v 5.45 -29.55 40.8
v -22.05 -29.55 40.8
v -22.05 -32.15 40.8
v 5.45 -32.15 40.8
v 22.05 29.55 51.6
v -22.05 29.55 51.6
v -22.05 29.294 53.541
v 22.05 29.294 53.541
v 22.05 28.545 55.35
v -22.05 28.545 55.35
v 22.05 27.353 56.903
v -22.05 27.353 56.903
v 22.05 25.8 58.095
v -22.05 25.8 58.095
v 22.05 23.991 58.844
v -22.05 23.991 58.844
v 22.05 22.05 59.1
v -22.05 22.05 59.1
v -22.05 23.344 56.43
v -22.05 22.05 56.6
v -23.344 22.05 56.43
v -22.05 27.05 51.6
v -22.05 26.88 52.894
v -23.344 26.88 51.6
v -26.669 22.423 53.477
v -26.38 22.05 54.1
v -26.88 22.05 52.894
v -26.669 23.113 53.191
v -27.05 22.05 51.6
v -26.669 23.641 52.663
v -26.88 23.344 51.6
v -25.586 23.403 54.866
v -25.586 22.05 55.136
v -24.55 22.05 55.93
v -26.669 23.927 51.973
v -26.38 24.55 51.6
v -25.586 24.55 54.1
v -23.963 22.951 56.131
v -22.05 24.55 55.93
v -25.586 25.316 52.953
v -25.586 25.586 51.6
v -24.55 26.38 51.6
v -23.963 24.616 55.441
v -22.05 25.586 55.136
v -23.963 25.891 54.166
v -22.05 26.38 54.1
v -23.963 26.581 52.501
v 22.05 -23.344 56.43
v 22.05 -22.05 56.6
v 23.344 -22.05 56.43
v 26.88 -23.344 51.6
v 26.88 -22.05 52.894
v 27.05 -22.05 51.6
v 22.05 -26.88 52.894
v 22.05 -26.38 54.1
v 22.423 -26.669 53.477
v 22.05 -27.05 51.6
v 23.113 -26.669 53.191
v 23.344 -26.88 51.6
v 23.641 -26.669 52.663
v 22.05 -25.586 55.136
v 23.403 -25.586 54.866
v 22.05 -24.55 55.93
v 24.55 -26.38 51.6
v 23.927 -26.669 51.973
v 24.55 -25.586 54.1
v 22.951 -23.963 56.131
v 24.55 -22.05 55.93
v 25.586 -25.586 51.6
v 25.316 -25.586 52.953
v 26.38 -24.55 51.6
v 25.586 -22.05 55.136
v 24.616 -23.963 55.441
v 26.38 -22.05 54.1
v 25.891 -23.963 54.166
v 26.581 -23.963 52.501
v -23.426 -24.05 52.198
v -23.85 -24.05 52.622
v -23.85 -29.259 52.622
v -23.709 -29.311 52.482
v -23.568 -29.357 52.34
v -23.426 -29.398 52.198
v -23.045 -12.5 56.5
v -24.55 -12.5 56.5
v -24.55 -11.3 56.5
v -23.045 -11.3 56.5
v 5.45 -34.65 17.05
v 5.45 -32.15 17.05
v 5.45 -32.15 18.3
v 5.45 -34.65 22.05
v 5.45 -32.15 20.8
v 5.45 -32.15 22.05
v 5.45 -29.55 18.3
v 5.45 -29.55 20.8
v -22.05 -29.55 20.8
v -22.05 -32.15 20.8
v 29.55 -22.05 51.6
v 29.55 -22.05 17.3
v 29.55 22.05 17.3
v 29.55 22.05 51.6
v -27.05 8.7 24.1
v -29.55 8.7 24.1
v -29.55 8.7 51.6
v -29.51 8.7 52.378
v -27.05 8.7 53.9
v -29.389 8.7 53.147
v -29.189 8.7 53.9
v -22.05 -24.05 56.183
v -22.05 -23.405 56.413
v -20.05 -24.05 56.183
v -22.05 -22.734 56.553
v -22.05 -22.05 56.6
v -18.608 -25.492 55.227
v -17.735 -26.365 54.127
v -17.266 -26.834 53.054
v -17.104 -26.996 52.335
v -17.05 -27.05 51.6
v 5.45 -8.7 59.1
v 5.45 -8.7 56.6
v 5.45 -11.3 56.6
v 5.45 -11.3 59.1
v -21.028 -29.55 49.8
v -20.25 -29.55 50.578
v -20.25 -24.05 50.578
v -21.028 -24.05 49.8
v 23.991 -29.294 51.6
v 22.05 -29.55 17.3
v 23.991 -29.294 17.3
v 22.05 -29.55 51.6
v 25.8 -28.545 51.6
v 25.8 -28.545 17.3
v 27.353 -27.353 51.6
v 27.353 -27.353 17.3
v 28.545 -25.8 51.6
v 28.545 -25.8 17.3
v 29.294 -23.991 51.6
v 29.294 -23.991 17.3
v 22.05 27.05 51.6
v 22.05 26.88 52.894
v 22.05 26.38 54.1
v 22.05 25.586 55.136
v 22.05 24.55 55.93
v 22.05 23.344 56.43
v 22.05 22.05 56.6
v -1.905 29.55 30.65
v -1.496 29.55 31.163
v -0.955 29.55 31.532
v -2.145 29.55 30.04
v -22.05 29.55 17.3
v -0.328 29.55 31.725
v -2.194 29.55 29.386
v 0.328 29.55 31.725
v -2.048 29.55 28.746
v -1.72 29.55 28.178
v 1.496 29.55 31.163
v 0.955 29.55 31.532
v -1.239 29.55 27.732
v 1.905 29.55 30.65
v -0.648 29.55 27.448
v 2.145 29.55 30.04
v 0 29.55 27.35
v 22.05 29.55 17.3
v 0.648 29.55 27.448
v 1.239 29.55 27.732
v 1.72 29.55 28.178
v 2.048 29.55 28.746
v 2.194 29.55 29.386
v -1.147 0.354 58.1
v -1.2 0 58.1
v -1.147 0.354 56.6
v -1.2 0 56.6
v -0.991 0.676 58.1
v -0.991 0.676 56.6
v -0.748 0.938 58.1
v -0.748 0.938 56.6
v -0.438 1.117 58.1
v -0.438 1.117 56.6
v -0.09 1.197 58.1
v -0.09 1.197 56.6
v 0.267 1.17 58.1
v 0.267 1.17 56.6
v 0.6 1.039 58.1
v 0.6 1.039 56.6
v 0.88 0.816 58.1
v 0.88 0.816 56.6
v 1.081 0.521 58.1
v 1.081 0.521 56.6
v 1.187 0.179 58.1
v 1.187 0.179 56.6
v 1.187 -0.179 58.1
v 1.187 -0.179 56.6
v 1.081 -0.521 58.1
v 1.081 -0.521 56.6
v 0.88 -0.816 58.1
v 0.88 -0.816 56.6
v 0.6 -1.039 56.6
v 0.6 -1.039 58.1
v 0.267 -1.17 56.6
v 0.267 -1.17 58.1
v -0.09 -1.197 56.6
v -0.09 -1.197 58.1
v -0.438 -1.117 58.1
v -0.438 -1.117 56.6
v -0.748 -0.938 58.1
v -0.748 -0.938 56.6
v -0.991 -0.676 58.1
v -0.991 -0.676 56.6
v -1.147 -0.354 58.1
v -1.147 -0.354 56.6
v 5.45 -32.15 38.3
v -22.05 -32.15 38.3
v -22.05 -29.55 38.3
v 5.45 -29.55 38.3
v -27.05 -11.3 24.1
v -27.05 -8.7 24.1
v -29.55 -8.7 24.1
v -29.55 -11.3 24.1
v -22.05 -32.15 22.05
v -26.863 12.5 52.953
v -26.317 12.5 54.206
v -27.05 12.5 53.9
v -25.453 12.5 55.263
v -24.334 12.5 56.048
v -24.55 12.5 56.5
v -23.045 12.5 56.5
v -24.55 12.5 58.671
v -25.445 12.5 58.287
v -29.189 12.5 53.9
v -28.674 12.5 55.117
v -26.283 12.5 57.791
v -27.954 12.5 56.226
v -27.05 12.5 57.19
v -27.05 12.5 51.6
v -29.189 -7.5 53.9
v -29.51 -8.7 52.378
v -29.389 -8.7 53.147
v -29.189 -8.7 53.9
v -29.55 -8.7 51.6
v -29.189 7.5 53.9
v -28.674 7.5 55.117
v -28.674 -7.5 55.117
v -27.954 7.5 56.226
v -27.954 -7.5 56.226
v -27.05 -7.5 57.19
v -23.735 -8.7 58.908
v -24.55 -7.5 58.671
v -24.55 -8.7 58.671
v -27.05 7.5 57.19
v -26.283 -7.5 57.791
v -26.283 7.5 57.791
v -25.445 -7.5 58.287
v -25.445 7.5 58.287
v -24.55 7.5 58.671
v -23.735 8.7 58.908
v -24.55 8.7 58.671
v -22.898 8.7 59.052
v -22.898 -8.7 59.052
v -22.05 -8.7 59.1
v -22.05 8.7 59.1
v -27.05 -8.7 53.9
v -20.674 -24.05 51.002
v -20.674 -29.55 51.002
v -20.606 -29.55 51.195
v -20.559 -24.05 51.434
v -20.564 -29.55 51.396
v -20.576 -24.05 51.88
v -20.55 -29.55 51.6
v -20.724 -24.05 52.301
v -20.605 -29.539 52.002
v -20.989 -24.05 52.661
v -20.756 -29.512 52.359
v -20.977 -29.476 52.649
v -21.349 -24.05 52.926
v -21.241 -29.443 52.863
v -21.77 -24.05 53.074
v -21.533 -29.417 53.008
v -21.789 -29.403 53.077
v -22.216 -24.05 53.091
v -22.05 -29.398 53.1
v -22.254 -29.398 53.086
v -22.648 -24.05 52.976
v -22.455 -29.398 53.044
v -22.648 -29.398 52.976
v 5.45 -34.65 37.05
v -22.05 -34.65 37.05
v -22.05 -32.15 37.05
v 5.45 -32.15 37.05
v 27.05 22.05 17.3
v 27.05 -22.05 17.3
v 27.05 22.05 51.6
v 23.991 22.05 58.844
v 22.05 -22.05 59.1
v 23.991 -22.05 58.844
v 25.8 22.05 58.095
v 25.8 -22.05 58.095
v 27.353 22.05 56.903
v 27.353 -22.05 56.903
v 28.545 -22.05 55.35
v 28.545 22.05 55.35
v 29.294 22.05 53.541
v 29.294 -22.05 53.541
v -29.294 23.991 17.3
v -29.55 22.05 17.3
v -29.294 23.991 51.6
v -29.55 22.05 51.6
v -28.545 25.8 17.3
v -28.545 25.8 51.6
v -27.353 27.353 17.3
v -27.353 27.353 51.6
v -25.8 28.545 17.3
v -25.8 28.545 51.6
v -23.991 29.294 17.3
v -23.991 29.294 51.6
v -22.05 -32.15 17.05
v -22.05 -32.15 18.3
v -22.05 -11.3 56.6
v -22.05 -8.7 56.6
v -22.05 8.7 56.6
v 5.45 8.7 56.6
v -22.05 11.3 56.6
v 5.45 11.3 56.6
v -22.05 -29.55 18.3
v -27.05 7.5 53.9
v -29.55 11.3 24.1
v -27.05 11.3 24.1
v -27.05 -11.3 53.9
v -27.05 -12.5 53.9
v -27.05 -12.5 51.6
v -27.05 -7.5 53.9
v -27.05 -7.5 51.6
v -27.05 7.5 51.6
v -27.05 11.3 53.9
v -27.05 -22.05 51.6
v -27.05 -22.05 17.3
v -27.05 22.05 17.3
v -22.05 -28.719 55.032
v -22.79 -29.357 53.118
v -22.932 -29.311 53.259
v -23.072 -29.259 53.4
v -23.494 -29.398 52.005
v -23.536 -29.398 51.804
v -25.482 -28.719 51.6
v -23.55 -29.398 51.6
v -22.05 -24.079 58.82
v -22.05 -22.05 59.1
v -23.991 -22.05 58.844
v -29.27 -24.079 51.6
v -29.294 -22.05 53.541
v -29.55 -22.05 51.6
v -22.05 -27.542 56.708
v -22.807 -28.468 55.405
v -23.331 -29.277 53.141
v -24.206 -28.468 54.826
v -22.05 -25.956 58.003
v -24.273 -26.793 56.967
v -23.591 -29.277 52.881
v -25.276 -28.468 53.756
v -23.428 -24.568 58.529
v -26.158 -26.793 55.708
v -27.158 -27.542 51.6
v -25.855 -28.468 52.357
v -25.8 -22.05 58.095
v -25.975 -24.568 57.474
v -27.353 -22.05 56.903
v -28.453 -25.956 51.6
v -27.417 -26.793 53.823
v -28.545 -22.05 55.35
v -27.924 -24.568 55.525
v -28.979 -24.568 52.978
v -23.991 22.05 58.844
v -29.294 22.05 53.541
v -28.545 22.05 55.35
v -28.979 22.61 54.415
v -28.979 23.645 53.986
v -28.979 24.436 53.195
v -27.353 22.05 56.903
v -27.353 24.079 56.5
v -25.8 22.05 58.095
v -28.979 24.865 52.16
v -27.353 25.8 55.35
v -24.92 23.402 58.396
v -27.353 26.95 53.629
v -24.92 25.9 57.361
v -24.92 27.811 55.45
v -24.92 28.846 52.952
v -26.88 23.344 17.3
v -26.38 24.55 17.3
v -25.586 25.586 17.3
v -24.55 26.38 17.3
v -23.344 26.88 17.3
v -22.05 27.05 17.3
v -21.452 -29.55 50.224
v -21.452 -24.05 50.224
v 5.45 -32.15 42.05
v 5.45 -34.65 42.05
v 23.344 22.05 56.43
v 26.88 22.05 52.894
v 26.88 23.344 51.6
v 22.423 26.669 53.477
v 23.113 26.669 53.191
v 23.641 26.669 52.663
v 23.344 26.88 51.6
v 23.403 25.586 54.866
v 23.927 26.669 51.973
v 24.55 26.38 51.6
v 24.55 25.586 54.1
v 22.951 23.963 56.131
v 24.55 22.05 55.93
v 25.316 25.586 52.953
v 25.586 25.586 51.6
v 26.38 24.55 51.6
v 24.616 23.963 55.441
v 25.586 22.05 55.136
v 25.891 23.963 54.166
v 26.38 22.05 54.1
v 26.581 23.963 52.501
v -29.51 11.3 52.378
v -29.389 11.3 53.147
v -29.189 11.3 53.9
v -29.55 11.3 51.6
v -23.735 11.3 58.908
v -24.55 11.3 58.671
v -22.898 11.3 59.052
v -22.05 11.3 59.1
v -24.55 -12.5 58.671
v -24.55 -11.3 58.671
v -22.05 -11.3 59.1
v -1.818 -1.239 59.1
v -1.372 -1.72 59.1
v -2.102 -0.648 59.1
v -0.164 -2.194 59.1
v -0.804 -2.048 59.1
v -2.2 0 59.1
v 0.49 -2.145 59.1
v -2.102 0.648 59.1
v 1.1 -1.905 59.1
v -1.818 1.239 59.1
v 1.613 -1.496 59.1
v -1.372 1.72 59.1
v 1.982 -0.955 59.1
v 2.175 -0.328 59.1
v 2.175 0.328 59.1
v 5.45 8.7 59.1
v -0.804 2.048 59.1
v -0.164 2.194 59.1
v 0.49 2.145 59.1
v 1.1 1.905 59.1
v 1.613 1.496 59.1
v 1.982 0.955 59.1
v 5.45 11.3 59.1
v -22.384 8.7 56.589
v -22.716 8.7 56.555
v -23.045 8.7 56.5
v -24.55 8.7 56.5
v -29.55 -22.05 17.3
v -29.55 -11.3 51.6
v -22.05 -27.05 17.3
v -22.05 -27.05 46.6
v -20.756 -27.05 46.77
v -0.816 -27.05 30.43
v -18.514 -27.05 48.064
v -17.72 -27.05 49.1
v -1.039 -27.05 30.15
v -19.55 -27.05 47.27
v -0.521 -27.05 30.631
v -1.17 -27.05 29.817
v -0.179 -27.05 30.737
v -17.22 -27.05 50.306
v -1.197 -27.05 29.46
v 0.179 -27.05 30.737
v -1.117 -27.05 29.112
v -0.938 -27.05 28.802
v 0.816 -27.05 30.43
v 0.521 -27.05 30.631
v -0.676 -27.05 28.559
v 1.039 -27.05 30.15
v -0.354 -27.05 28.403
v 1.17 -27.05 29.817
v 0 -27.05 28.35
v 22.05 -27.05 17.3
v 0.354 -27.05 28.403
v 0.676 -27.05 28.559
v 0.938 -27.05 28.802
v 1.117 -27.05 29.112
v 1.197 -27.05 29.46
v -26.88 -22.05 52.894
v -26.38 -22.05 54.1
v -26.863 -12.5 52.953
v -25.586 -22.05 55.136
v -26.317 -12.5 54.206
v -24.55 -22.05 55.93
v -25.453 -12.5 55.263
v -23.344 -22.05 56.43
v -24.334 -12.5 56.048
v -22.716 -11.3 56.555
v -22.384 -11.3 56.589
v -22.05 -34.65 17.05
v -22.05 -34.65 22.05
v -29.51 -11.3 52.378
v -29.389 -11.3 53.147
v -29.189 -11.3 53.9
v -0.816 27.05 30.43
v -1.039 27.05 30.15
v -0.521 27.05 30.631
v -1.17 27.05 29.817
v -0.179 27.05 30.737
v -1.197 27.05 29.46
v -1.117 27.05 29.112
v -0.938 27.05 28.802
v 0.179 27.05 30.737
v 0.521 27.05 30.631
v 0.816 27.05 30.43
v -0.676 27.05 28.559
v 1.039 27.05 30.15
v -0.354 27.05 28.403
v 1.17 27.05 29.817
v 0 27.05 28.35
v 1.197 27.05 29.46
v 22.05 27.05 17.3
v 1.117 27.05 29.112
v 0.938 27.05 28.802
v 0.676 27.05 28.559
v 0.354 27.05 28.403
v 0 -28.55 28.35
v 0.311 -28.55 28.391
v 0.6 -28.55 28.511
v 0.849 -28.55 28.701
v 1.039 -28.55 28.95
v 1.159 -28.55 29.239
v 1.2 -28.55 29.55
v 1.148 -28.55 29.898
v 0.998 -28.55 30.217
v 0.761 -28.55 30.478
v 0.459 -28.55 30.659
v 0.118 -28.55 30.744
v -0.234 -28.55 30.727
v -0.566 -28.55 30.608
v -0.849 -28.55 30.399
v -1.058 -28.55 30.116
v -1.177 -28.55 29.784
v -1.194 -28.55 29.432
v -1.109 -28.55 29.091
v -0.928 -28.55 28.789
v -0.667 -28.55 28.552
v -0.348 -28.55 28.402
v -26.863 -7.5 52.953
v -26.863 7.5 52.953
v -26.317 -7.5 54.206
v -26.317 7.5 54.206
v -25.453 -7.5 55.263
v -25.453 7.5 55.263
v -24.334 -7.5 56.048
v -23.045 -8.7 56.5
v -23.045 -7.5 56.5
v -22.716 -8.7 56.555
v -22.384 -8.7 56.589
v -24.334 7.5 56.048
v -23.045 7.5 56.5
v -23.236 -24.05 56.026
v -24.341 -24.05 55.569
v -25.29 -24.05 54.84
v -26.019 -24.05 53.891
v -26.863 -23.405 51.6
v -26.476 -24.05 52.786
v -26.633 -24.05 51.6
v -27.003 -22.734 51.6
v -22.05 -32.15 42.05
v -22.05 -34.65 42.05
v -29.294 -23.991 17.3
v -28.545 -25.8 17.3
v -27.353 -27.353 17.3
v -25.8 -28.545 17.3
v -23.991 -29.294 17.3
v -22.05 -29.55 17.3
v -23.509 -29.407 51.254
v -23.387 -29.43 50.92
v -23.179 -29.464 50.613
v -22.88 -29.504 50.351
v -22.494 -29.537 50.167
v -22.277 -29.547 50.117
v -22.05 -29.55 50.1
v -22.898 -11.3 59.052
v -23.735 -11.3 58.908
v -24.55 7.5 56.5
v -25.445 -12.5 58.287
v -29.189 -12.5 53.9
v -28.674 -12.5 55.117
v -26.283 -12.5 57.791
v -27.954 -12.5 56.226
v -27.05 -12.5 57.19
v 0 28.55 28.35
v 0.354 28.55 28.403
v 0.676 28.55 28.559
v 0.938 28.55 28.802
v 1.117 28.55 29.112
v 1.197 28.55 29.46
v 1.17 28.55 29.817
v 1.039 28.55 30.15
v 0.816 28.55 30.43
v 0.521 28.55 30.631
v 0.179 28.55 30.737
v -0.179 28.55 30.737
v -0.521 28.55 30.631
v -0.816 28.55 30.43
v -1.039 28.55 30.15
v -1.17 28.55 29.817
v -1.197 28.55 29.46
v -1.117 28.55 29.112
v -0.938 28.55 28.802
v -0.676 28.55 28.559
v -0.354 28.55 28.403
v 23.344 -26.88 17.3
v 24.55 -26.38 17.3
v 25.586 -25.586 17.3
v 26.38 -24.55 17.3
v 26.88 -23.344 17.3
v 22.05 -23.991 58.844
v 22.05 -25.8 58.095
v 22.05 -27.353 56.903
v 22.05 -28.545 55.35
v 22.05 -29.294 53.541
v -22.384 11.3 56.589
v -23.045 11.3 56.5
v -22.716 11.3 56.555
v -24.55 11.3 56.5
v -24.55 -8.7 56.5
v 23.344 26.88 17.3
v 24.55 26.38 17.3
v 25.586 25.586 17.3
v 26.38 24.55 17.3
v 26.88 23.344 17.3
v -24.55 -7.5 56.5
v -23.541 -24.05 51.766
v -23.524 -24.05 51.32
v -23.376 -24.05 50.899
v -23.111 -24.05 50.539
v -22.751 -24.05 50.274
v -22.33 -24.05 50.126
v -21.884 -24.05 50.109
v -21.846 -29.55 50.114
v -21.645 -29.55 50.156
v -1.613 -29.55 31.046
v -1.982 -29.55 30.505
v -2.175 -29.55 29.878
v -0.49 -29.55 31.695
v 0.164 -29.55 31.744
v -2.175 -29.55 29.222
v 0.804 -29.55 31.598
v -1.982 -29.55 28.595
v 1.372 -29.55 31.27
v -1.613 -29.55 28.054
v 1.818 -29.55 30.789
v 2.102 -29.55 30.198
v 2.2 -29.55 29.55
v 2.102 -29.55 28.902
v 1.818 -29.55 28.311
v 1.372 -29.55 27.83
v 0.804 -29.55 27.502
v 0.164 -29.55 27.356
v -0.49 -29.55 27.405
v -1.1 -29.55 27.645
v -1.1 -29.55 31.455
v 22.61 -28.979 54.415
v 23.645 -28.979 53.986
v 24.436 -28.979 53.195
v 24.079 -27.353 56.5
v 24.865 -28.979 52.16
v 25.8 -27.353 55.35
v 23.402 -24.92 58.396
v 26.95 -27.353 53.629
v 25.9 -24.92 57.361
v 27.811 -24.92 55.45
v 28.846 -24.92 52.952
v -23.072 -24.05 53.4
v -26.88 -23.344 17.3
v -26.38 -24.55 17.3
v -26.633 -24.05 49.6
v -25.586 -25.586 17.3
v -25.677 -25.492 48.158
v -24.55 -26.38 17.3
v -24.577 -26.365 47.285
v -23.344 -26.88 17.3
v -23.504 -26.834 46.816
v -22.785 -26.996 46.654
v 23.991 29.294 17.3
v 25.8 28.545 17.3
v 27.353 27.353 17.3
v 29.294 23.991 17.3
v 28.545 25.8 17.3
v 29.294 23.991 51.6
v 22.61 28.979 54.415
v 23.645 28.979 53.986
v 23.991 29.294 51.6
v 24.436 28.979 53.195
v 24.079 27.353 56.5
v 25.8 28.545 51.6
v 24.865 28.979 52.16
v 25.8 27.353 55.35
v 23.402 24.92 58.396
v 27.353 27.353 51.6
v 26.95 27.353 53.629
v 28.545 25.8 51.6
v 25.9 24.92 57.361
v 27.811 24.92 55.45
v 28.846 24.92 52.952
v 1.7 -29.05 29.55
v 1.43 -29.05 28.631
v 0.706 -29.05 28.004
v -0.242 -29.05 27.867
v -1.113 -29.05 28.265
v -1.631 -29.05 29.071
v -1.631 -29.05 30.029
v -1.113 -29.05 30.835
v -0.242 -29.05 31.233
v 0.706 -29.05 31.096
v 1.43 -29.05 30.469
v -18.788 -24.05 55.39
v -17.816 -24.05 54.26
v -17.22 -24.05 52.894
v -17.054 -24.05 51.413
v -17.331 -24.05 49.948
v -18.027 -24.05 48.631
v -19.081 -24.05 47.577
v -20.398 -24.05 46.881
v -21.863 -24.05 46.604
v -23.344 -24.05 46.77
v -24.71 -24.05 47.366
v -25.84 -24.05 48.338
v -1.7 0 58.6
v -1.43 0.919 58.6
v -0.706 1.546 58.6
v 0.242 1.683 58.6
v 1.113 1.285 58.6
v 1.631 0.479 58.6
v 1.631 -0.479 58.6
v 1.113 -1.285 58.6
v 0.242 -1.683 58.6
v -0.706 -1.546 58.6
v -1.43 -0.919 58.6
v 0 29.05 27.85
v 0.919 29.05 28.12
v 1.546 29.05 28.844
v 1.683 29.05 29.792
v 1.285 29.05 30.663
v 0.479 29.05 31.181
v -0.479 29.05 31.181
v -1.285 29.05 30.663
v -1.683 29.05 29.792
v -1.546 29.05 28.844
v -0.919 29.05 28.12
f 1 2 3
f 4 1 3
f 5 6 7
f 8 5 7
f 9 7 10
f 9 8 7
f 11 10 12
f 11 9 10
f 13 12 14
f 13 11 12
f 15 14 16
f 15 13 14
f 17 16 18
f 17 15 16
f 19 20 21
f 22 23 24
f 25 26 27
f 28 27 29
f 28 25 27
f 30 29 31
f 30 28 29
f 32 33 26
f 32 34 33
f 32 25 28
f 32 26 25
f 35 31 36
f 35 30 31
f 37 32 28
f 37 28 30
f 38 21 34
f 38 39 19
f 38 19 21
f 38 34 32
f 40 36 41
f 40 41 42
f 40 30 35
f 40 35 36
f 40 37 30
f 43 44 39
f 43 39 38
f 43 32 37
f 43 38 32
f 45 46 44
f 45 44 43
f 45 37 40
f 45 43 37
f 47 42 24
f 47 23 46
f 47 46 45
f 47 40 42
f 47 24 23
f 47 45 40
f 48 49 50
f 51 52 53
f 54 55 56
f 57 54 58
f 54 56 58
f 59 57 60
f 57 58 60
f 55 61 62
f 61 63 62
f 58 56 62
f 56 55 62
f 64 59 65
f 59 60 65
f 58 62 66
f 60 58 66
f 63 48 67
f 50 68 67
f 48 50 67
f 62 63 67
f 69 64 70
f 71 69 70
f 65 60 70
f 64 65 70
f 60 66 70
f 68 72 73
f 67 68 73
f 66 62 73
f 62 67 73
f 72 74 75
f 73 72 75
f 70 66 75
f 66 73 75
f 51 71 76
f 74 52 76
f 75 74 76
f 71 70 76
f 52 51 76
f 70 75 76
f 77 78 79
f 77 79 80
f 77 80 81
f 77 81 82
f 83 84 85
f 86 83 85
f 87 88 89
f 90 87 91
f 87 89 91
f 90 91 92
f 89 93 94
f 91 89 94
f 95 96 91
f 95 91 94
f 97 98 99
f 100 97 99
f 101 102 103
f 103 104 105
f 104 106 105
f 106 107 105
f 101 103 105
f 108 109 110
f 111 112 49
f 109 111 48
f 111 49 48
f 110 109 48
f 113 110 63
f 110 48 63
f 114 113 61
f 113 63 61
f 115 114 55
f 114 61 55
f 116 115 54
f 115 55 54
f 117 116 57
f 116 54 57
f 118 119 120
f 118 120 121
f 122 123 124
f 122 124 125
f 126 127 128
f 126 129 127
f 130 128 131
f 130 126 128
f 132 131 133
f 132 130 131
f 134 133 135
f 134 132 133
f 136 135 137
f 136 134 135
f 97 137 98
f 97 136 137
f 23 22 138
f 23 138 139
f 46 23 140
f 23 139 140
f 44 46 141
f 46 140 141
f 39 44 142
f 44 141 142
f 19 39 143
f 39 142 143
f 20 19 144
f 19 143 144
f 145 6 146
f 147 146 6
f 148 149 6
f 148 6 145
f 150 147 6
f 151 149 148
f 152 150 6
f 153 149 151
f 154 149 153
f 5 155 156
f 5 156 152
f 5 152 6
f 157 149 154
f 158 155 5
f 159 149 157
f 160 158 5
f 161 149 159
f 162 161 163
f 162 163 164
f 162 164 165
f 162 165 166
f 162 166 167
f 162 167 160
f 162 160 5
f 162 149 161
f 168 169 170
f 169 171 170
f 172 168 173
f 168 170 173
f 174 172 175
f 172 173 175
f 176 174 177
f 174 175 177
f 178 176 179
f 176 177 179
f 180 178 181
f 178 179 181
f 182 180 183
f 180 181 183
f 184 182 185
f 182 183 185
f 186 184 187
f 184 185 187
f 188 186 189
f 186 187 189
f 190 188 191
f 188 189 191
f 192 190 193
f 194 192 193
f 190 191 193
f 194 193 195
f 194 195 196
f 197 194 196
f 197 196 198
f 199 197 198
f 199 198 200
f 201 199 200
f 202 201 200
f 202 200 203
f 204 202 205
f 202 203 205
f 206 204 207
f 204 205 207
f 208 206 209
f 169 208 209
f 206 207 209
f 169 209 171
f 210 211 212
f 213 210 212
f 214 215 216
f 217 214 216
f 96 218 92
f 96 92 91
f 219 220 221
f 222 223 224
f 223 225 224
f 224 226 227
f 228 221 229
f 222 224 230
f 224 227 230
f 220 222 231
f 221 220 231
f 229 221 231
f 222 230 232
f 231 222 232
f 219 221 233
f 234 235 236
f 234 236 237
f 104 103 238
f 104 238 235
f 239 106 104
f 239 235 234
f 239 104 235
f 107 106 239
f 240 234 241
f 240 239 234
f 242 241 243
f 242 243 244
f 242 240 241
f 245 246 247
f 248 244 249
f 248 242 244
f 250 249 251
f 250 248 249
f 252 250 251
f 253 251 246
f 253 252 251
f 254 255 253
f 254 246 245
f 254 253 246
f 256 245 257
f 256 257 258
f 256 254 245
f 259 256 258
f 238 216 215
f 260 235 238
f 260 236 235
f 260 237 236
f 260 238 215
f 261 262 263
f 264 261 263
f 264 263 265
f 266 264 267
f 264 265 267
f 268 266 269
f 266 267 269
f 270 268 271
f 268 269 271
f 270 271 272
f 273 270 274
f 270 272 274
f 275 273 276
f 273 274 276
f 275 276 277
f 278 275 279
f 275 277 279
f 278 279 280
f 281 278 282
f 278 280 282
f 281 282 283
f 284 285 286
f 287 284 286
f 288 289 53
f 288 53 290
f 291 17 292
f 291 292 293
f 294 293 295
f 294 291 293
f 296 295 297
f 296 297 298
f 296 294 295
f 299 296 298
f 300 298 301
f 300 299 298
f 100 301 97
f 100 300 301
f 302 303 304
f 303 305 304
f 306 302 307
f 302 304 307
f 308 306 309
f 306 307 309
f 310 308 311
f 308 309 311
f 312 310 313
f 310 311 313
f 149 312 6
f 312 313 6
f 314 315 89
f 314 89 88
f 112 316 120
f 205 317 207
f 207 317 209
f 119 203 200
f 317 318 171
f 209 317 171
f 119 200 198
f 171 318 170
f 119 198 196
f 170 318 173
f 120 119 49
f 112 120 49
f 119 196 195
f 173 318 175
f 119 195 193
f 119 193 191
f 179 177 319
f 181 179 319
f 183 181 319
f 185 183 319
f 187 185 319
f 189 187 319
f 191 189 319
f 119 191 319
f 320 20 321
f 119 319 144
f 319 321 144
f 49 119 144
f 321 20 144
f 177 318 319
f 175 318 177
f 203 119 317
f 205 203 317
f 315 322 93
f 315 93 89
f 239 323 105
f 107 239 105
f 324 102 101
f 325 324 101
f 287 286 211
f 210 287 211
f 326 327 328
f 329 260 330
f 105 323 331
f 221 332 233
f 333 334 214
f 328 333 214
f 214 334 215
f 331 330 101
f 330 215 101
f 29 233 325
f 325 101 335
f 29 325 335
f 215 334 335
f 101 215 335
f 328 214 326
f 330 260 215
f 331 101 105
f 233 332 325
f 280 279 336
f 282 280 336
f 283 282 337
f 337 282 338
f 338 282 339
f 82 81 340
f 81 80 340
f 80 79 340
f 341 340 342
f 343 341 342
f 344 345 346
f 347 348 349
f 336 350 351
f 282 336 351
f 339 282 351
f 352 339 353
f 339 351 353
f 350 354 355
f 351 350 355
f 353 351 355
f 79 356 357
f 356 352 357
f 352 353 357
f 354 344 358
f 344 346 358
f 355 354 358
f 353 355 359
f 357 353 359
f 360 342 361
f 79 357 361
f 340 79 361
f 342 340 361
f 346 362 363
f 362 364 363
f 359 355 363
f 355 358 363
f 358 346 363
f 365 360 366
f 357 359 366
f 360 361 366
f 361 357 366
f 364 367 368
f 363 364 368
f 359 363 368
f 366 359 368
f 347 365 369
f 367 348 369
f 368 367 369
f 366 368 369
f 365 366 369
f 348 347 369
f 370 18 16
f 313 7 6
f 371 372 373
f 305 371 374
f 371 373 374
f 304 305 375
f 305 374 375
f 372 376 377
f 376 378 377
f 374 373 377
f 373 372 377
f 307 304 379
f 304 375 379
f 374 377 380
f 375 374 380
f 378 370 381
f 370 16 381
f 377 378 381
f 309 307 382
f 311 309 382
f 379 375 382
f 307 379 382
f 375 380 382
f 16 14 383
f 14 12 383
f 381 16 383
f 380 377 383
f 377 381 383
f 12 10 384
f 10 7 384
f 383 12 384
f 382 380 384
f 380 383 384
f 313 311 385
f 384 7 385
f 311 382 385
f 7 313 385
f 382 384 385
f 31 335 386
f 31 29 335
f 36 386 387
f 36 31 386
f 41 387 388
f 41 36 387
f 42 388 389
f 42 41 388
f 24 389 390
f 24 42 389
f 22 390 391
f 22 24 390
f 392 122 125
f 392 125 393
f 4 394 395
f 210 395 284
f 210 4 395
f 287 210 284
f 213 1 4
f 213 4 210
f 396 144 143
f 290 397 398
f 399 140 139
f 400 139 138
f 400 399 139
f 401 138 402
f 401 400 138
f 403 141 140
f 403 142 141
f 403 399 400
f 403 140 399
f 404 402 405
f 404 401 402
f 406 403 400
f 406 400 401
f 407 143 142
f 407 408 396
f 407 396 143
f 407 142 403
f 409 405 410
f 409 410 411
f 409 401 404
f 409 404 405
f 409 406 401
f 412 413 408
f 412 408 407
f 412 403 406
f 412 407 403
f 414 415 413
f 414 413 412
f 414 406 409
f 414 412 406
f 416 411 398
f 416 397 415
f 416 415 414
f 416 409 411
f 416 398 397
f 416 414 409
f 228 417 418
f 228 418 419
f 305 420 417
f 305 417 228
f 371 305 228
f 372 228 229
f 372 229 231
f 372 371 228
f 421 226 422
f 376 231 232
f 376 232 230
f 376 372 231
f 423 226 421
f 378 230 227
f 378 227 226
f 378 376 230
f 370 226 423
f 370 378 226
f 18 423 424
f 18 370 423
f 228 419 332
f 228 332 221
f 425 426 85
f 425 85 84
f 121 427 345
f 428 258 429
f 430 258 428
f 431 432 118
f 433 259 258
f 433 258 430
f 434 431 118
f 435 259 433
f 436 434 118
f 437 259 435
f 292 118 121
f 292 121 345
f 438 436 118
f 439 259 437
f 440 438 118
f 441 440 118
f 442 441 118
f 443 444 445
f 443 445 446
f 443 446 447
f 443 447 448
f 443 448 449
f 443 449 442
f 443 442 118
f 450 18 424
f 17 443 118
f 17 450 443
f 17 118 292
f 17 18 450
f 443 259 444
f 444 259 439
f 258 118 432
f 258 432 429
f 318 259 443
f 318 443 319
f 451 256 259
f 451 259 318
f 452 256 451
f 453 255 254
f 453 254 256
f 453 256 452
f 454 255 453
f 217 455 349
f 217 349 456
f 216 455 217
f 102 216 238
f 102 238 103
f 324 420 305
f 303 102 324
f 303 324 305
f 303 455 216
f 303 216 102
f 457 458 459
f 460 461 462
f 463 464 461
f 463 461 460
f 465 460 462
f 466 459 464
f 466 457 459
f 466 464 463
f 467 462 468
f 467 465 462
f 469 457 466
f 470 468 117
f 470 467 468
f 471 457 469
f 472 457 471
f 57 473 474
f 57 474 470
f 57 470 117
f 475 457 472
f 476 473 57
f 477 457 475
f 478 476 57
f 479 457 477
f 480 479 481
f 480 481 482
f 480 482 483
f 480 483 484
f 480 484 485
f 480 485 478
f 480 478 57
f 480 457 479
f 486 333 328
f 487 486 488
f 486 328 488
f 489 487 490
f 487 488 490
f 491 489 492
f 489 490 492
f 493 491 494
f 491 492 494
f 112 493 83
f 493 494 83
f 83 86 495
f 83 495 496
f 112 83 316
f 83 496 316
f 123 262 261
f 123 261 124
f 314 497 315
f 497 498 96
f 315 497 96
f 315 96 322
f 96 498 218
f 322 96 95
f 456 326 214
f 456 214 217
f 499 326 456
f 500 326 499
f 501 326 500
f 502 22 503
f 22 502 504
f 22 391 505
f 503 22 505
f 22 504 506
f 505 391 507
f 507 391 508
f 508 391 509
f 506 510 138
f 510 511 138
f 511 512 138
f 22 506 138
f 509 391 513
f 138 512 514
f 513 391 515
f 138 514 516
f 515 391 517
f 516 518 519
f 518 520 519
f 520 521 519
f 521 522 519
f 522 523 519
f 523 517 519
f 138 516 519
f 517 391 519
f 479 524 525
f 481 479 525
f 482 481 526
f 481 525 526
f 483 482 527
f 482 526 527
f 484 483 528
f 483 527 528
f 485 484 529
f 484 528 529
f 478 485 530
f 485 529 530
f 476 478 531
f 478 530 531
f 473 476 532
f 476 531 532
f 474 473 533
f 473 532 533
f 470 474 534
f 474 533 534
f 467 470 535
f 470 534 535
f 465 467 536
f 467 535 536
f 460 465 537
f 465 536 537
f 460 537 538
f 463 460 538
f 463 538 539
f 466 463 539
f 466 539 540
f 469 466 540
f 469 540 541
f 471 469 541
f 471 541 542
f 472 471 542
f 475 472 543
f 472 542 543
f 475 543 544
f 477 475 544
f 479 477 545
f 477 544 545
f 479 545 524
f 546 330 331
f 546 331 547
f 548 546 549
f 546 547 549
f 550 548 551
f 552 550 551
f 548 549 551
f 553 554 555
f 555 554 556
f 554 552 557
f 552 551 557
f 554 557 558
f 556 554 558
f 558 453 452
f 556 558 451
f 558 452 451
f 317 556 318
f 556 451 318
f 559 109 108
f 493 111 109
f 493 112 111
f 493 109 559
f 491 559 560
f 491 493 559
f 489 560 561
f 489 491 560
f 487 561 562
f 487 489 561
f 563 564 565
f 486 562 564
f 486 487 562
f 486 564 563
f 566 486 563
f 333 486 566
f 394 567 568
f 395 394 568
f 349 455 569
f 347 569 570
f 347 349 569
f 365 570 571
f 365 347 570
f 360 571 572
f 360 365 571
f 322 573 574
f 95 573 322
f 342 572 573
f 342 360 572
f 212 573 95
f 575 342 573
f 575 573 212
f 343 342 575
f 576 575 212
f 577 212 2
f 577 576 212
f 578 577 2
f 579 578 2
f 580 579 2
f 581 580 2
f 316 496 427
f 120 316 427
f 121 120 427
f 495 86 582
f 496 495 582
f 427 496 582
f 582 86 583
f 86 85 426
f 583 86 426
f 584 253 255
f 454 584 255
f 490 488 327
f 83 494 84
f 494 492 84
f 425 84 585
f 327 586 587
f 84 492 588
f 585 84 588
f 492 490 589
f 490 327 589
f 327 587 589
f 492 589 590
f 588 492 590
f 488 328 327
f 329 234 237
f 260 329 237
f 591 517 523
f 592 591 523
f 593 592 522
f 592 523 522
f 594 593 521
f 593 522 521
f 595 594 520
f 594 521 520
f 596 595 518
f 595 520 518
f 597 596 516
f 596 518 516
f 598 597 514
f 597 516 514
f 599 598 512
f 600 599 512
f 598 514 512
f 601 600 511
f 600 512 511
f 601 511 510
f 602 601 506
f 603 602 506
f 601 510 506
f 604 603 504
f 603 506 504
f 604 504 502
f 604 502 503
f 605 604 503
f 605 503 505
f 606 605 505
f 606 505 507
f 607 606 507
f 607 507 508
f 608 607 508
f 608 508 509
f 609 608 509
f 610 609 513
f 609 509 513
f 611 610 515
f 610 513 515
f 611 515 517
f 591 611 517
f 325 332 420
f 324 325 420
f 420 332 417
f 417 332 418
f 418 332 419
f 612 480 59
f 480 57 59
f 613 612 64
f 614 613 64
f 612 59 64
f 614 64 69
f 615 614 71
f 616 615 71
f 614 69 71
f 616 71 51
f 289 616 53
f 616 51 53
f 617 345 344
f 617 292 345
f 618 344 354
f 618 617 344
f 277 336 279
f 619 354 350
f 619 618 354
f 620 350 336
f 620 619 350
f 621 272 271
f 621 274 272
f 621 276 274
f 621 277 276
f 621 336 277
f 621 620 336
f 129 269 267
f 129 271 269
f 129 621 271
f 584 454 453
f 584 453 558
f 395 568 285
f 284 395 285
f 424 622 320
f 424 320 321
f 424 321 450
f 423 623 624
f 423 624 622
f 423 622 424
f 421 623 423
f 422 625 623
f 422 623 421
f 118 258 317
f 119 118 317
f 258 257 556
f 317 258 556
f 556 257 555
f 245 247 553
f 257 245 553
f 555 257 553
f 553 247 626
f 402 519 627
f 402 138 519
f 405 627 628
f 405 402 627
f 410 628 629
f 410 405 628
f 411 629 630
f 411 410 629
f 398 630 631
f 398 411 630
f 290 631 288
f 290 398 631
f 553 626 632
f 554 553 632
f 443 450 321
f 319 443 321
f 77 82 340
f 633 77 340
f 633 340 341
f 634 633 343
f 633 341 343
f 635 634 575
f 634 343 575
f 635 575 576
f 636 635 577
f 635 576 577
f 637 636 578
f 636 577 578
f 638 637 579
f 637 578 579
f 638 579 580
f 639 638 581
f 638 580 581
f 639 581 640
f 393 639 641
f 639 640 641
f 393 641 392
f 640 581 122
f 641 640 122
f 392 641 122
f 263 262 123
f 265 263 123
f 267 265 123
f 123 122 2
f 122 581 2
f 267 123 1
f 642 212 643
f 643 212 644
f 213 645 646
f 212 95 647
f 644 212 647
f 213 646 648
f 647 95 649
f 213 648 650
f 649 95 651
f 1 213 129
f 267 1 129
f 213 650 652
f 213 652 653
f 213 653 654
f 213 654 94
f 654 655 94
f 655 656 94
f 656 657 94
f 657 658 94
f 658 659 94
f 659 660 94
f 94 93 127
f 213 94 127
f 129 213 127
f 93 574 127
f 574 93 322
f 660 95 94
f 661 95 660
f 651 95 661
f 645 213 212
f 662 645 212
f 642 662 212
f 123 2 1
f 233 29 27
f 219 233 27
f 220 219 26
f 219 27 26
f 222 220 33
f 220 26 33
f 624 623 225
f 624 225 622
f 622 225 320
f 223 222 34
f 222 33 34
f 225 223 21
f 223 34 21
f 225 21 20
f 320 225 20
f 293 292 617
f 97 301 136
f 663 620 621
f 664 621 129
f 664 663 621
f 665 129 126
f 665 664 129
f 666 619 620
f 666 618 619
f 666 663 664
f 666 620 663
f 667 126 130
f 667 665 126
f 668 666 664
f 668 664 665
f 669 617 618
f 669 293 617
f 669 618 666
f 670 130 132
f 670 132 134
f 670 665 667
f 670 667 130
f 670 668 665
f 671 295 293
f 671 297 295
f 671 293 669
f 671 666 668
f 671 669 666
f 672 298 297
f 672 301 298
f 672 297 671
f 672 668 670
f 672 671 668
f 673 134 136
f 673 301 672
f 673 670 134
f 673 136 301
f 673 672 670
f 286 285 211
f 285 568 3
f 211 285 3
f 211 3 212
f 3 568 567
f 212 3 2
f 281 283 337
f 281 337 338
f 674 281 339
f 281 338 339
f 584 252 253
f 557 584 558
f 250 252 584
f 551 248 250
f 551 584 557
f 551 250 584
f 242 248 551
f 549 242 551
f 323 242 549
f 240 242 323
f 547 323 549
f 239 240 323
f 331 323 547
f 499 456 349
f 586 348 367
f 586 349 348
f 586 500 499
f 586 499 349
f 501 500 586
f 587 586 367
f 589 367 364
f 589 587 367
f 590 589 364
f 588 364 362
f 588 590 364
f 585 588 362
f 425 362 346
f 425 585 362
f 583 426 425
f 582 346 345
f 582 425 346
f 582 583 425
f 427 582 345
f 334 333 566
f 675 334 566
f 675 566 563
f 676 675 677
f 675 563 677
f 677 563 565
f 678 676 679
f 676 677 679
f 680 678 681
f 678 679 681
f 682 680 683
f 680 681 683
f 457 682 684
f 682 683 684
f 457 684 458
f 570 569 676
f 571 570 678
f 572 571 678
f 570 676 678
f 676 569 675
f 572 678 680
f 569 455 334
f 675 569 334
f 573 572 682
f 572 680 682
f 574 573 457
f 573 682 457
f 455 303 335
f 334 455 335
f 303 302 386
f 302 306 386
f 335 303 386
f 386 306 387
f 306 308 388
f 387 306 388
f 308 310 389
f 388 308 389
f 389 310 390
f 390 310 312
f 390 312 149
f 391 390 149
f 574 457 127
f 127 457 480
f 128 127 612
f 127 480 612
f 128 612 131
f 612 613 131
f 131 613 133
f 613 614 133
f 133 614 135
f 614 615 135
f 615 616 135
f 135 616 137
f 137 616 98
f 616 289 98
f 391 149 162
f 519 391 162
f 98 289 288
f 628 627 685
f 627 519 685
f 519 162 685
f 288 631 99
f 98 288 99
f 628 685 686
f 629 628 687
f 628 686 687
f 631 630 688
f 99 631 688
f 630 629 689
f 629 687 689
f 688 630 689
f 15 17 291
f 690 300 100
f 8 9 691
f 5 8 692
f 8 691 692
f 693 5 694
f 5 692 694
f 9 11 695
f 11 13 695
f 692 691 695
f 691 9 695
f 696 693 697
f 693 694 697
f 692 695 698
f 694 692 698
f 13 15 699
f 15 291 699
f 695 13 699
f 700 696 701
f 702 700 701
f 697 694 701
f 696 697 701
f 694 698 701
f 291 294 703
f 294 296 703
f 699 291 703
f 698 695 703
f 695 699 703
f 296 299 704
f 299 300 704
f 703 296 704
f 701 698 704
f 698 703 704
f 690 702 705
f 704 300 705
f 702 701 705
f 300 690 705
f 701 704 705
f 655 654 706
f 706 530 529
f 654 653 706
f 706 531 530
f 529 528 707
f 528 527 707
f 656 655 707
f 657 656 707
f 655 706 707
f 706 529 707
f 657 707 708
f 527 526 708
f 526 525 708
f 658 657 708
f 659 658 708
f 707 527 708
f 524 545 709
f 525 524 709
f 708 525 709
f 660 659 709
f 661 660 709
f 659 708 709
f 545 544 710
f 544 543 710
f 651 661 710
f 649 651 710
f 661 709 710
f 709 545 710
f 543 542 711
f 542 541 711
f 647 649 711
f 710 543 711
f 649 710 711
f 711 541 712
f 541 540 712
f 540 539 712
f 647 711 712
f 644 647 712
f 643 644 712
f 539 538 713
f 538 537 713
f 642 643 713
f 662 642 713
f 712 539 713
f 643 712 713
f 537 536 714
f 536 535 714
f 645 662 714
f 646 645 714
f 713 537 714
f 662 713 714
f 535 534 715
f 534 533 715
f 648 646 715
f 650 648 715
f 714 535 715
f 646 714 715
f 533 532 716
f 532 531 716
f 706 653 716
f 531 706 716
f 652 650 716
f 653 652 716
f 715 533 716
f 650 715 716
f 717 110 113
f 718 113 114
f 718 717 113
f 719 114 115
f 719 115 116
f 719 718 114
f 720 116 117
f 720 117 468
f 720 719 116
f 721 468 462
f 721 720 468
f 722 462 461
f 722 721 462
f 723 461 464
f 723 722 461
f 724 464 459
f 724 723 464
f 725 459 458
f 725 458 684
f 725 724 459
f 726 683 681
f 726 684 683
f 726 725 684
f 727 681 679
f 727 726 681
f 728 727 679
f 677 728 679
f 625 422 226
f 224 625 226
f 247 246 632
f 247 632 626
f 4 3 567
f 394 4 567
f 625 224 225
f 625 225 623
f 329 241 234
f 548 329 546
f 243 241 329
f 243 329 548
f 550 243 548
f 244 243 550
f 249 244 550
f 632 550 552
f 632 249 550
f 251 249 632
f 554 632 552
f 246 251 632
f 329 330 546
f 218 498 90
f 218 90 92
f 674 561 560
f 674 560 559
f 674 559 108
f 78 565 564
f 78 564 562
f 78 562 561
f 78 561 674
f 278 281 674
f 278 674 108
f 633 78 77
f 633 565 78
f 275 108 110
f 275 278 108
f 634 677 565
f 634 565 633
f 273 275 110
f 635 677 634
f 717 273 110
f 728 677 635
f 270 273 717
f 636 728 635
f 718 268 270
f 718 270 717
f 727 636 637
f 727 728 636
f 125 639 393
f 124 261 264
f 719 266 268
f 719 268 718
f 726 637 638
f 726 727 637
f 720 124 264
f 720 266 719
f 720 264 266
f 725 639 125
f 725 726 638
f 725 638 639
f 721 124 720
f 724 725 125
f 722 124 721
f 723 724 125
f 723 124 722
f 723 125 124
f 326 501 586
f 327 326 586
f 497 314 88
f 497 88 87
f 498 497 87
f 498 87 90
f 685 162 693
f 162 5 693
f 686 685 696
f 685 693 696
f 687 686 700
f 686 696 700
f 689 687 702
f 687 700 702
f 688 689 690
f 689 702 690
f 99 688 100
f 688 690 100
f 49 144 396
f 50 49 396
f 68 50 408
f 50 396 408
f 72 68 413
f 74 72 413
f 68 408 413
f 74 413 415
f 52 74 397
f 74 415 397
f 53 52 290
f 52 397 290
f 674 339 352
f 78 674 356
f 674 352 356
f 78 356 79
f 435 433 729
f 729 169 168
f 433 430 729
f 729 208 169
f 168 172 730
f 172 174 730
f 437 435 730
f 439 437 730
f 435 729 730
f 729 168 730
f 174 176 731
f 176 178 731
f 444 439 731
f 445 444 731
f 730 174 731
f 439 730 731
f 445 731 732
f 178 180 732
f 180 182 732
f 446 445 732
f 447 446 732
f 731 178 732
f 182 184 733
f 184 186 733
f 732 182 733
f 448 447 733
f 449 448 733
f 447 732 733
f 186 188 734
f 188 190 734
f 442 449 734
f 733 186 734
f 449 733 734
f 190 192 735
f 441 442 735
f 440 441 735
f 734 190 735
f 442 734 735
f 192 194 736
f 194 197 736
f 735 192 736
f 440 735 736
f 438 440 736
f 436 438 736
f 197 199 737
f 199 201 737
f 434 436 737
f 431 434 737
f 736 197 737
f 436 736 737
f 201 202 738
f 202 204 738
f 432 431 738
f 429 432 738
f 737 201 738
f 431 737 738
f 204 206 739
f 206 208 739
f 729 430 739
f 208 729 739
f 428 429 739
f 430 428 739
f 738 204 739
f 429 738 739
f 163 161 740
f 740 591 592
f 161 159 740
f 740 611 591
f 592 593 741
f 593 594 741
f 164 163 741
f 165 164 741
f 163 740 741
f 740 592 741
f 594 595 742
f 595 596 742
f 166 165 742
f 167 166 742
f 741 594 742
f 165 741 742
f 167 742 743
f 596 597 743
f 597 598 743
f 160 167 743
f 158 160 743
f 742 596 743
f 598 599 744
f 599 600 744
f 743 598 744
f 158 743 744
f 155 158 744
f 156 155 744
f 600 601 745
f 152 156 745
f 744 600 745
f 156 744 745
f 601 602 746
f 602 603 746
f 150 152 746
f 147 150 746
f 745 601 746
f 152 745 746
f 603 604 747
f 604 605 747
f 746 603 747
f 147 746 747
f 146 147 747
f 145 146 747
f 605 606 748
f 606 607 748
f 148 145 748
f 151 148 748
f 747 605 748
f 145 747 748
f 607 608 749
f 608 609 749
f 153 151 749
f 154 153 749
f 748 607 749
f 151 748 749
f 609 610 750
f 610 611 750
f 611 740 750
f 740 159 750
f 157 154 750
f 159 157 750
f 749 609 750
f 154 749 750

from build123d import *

# Parameters (mm, degrees)
SKETCH1_W                                            = 59.1
SKETCH1_H                                            = 59.1
BOSS_EXTRUDE1_DEPTH                                  = 59.1
CUT_EXTRUDE1_START                                   = -2.25
SKETCH2_W                                            = 116.357411776
SKETCH2_H                                            = 94.431830133
CUT_EXTRUDE1_DEPTH                                   = 71.232302632
FILLET1_R                                            = 7.5
SHELL1_T                                             = -2.5
CUT_EXTRUDE7_DEPTH                                   = 35
CUT_EXTRUDE8_DEPTH                                   = 35
SKETCH16_W                                           = 0.690169944
SKETCH16_H                                           = 5
CUT_EXTRUDE9_DEPTH                                   = 88.003290168
BOSS_EXTRUDE2_START                                  = 3
SKETCH18_R                                           = 5
BOSS_EXTRUDE2_DEPTH                                  = 3
SKETCH17_R                                           = 1.5
CUT_EXTRUDE10_DEPTH                                  = 10
CUT_EXTRUDE11_REACH                                  = 90.65
CSK_SLOT_FOR_M2_COUNTERSUNK_FLAT_HEAD_SC_D           = 2.4
CSK_SLOT_FOR_M2_COUNTERSUNK_FLAT_HEAD_SC_CSINK_D     = 4.4
CSK_SLOT_FOR_M2_COUNTERSUNK_FLAT_HEAD_SC_CSINK_ANGLE = 90
CSK_SLOT_FOR_M2_COUNTERSUNK_FLAT_HEA_2_D             = 2.4
CSK_SLOT_FOR_M2_COUNTERSUNK_FLAT_HEA_2_CSINK_D       = 4.4
CSK_SLOT_FOR_M2_COUNTERSUNK_FLAT_HEA_2_CSINK_ANGLE   = 90
CSK_SLOT_FOR_M2_COUNTERSUNK_FLAT_HEA_3_D             = 2.4
CSK_SLOT_FOR_M2_COUNTERSUNK_FLAT_HEA_3_CSINK_D       = 4.4
CSK_SLOT_FOR_M2_COUNTERSUNK_FLAT_HEA_3_CSINK_ANGLE   = 90
BOSS_EXTRUDE3_DEPTH                                  = 35
SKETCH28_W                                           = 7.5
SKETCH28_H                                           = 5.1
CUT_EXTRUDE12_DEPTH                                  = 62.984090748


with BuildPart() as part:
    # Sketch1 → Boss-Extrude1 (new body)
    with BuildSketch(Plane.XY):
        Rectangle(SKETCH1_W, SKETCH1_H)
    extrude(amount=BOSS_EXTRUDE1_DEPTH)

    # Sketch2 → Cut-Extrude1 (cut, through all)
    with BuildSketch(Plane(origin=(-13.400446417, -13.400446417, 19.55), x_dir=(0.9659258262890684, -0.2588190451025203, 0), z_dir=(0, 0, 1)).offset(CUT_EXTRUDE1_START)):
        with Locations((15.241895832, 15.980077556)):
            Rectangle(SKETCH2_W, SKETCH2_H)
    extrude(amount=-CUT_EXTRUDE1_DEPTH, mode=Mode.SUBTRACT)

    # Fillet1
    fillet1_edges = [part.edges().sort_by_distance(p)[0] for p in [
        (29.55, 0, 59.1),
        (0, 29.55, 59.1),
        (-29.55, 0, 59.1),
        (0, -29.55, 59.1),
        (-29.55, 29.55, 38.2),
        (29.55, 29.55, 38.2),
        (29.55, -29.55, 38.2),
        (-29.55, -29.55, 38.2),
    ]]
    fillet(fillet1_edges, radius=FILLET1_R)

    # Shell1
    shell1_openings = [part.faces().sort_by_distance(p)[0] for p in [
        (0, 0, 17.3),
    ]]
    offset(amount=SHELL1_T, openings=shell1_openings, kind=Kind.INTERSECTION)

    # Sketch14 → Cut-Extrude7 (cut)
    with BuildSketch(Plane.XY.offset(59.1)):
        Polygon((-29.55, -8.7), (-27.05, -8.7), (-27.05, -7.5), (-24.55, -7.5), (-24.55, -12.5), (-27.05, -12.5), (-27.05, -11.3), (-29.55, -11.3), align=None)
        Polygon((-29.55, 11.3), (-29.55, 8.7), (-27.05, 8.7), (-27.05, 7.5), (-24.55, 7.5), (-24.55, 12.5), (-27.05, 12.5), (-27.05, 11.3), align=None)
    extrude(amount=-CUT_EXTRUDE7_DEPTH, mode=Mode.SUBTRACT)

    # Sketch15 → Cut-Extrude8 (cut)
    with BuildSketch(Plane(origin=(-29.55, 0, -29.55), x_dir=(0, 0, -1), z_dir=(1, 0, 0))):
        Polygon((-88.65, -8.7), (-86.05, -8.7), (-86.05, -7.5), (-83.45, -7.5), (-83.45, -12.5), (-86.05, -12.5), (-86.05, -11.3), (-88.65, -11.3), align=None)
        Polygon((-88.65, 11.3), (-88.65, 8.7), (-86.05, 8.7), (-86.05, 7.5), (-83.45, 7.5), (-83.45, 12.5), (-86.05, 12.5), (-86.05, 11.3), align=None)
    extrude(amount=CUT_EXTRUDE8_DEPTH, mode=Mode.SUBTRACT)

    # Sketch16 → Cut-Extrude9 (cut, through all)
    with BuildSketch(Plane(origin=(-27.05, 0, 0), x_dir=(0, 0, -1), z_dir=(1, 0, 0))):
        with Locations((-56.845084972, -10)):
            Rectangle(SKETCH16_W, SKETCH16_H)
        with Locations((-56.845084972, 10)):
            Rectangle(SKETCH16_W, SKETCH16_H)
    extrude(amount=-CUT_EXTRUDE9_DEPTH, mode=Mode.SUBTRACT)

    # Sketch18 → Boss-Extrude2 (add)
    with BuildSketch(Plane(origin=(0, -27.05, 0), x_dir=(1, 0, 0), z_dir=(0, 1, 0)).offset(BOSS_EXTRUDE2_START)):
        with Locations((-22.05, -51.6)):
            Circle(SKETCH18_R)
    extrude(amount=-BOSS_EXTRUDE2_DEPTH)

    # Sketch17 → Cut-Extrude10 (cut)
    with BuildSketch(Plane.XZ.offset(29.55)):
        with Locations(Location((-22.05, 51.6, 0), (0, 0, 90))):
            Circle(SKETCH17_R)
    extrude(amount=-CUT_EXTRUDE10_DEPTH, mode=Mode.SUBTRACT)

    # Sketch20 → Cut-Extrude11 (cut, up to next)
    with BuildSketch(Plane.XZ.offset(29.55), mode=Mode.PRIVATE) as cut_extrude11_sk1:
        with BuildLine():
            Line((-22.647878988, 52.975696447), (-23.072143057, 53.399960516))
            Line((-23.072143057, 53.399960516), (-23.849960516, 52.622143057))
            Line((-23.849960516, 52.622143057), (-23.425696447, 52.197878988))
            ThreePointArc((-23.425696447, 52.197878988), (-23.110660172, 52.660660172), (-22.647878988, 52.975696447))
        make_face()
    cut_extrude11_tool1 = extrude(cut_extrude11_sk1.sketch, amount=-CUT_EXTRUDE11_REACH, mode=Mode.PRIVATE) & part.part
    # Sketch20 → Cut-Extrude11 (cut, up to next)
    with BuildSketch(Plane.XZ.offset(29.55), mode=Mode.PRIVATE) as cut_extrude11_sk2:
        with BuildLine():
            Line((-21.027856943, 49.800039484), (-21.452121012, 50.224303553))
            ThreePointArc((-21.452121012, 50.224303553), (-20.989339828, 50.539339828), (-20.674303553, 51.002121012))
            Line((-20.674303553, 51.002121012), (-20.250039484, 50.577856943))
            Line((-20.250039484, 50.577856943), (-21.027856943, 49.800039484))
        make_face()
    cut_extrude11_tool2 = extrude(cut_extrude11_sk2.sketch, amount=-CUT_EXTRUDE11_REACH, mode=Mode.PRIVATE) & part.part
    add(cut_extrude11_tool1.solids().sort_by_distance((-23.27308, -29.55, 52.82308))[0], mode=Mode.SUBTRACT)
    add(cut_extrude11_tool2.solids().sort_by_distance((-20.82692, -29.55, 50.37692))[0], mode=Mode.SUBTRACT)

    # CSK SLOT for M2 Countersunk Flat Head Sc (through all)
    with Locations(Plane.ZX.offset(29.55)):
        with Locations((29.55, 0)):
            CounterSinkHole(CSK_SLOT_FOR_M2_COUNTERSUNK_FLAT_HEAD_SC_D / 2, CSK_SLOT_FOR_M2_COUNTERSUNK_FLAT_HEAD_SC_CSINK_D / 2, counter_sink_angle=CSK_SLOT_FOR_M2_COUNTERSUNK_FLAT_HEAD_SC_CSINK_ANGLE)

    # CSK SLOT for M2 Countersunk Flat Hea 2 (through all)
    with Locations(Plane.XY.offset(59.1)):
        with Locations((0, 0)):
            CounterSinkHole(CSK_SLOT_FOR_M2_COUNTERSUNK_FLAT_HEA_2_D / 2, CSK_SLOT_FOR_M2_COUNTERSUNK_FLAT_HEA_2_CSINK_D / 2, counter_sink_angle=CSK_SLOT_FOR_M2_COUNTERSUNK_FLAT_HEA_2_CSINK_ANGLE)

    # CSK SLOT for M2 Countersunk Flat Hea 3 (through all)
    with Locations(Plane(origin=(0, -29.55, 0), x_dir=(-1, 0, 0), z_dir=(0, -1, 0))):
        with Locations((0, -29.55)):
            CounterSinkHole(CSK_SLOT_FOR_M2_COUNTERSUNK_FLAT_HEA_3_D / 2, CSK_SLOT_FOR_M2_COUNTERSUNK_FLAT_HEA_3_CSINK_D / 2, counter_sink_angle=CSK_SLOT_FOR_M2_COUNTERSUNK_FLAT_HEA_3_CSINK_ANGLE)

    # Sketch27 → Boss-Extrude3 (add)
    with BuildSketch(Plane(origin=(-29.55, 29.55, 0), x_dir=(0, 0, -1), z_dir=(1, 0, 0))):
        Polygon((-18.3, -59.1), (-18.3, -61.7), (-17.05, -61.7), (-17.05, -64.2), (-22.05, -64.2), (-22.05, -61.7), (-20.8, -61.7), (-20.8, -59.1), align=None)
        Polygon((-38.3, -59.1), (-40.8, -59.1), (-40.8, -61.7), (-42.05, -61.7), (-42.05, -64.2), (-37.05, -64.2), (-37.05, -61.7), (-38.3, -61.7), align=None)
    extrude(amount=BOSS_EXTRUDE3_DEPTH)

    # Sketch28 → Cut-Extrude12 (cut, through all)
    with BuildSketch(Plane.XY.offset(59.1)):
        with Locations((-25.8, -32.1)):
            Rectangle(SKETCH28_W, SKETCH28_H)
    extrude(amount=-CUT_EXTRUDE12_DEPTH, mode=Mode.SUBTRACT)


solid = part.part
